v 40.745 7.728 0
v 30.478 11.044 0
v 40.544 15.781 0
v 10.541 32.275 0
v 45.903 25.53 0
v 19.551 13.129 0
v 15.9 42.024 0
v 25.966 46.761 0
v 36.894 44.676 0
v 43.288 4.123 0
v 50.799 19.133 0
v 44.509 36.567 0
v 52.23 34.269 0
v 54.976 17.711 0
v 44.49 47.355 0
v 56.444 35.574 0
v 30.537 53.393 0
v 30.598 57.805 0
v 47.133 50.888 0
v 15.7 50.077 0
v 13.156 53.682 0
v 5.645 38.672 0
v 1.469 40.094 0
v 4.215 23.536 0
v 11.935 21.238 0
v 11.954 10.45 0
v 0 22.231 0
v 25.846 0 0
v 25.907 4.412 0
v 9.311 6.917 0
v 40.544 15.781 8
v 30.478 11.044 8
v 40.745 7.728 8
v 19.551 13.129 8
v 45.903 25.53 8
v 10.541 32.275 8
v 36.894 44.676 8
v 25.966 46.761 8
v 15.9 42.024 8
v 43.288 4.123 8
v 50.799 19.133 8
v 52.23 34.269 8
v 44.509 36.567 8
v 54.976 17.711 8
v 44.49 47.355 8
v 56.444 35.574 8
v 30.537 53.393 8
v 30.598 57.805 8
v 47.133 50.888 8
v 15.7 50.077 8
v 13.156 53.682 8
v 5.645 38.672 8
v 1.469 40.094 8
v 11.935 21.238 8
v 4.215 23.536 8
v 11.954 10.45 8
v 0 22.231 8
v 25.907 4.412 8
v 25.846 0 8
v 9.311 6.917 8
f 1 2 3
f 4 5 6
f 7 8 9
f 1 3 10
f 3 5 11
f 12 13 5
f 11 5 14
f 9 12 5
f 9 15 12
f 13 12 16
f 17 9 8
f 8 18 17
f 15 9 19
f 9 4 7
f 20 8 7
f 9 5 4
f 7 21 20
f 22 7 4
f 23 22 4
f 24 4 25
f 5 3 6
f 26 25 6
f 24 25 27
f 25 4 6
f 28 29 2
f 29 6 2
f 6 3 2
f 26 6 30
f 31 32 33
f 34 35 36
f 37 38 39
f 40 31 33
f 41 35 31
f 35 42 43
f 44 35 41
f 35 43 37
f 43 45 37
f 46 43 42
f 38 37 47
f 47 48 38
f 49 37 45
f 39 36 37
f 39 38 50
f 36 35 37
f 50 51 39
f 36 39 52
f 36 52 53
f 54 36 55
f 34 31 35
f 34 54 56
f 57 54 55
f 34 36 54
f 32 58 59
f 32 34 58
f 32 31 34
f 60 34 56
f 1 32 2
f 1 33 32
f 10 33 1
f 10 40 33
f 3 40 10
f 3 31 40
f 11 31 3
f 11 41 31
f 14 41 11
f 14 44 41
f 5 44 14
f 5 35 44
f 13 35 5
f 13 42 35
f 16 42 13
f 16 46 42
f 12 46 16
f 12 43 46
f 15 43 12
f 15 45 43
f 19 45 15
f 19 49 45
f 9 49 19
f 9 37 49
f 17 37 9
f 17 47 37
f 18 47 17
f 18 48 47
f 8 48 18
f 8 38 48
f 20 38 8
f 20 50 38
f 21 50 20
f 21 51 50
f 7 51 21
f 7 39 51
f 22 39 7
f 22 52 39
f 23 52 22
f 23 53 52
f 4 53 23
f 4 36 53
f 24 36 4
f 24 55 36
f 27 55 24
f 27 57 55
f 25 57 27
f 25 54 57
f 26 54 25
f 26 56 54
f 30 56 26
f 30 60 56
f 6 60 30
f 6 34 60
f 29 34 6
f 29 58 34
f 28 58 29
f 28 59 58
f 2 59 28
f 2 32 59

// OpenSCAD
$fn = 32;

// ----------------------------------------------------------------------
// Fan rotor section: 10 blades, 18 mm hub radius, 11 mm blades
// ----------------------------------------------------------------------

// --- parameters (mm) ---
profile_height = 8;       // extrusion height
profile_points = 30;      // points of the closed outline

profile = [[45.903, 25.53], [52.23, 34.269], [56.444, 35.574], [44.509, 36.567], [44.49, 47.355], [47.133, 50.888], [36.894, 44.676], [30.537, 53.393], [30.598, 57.805], [25.966, 46.761], [15.7, 50.077], [13.156, 53.682], [15.9, 42.024], [5.645, 38.672], [1.469, 40.094], [10.541, 32.275], [4.215, 23.536], [0, 22.231], [11.935, 21.238], [11.954, 10.45], [9.311, 6.917], [19.551, 13.129], [25.907, 4.412], [25.846, 0], [30.478, 11.044], [40.745, 7.728], [43.288, 4.123], [40.544, 15.781], [50.799, 19.133], [54.976, 17.711]];  // single closed polygon, 30 points, counter clockwise

// --- the one profile operation ---
linear_extrude(height = profile_height) polygon(points = profile);
